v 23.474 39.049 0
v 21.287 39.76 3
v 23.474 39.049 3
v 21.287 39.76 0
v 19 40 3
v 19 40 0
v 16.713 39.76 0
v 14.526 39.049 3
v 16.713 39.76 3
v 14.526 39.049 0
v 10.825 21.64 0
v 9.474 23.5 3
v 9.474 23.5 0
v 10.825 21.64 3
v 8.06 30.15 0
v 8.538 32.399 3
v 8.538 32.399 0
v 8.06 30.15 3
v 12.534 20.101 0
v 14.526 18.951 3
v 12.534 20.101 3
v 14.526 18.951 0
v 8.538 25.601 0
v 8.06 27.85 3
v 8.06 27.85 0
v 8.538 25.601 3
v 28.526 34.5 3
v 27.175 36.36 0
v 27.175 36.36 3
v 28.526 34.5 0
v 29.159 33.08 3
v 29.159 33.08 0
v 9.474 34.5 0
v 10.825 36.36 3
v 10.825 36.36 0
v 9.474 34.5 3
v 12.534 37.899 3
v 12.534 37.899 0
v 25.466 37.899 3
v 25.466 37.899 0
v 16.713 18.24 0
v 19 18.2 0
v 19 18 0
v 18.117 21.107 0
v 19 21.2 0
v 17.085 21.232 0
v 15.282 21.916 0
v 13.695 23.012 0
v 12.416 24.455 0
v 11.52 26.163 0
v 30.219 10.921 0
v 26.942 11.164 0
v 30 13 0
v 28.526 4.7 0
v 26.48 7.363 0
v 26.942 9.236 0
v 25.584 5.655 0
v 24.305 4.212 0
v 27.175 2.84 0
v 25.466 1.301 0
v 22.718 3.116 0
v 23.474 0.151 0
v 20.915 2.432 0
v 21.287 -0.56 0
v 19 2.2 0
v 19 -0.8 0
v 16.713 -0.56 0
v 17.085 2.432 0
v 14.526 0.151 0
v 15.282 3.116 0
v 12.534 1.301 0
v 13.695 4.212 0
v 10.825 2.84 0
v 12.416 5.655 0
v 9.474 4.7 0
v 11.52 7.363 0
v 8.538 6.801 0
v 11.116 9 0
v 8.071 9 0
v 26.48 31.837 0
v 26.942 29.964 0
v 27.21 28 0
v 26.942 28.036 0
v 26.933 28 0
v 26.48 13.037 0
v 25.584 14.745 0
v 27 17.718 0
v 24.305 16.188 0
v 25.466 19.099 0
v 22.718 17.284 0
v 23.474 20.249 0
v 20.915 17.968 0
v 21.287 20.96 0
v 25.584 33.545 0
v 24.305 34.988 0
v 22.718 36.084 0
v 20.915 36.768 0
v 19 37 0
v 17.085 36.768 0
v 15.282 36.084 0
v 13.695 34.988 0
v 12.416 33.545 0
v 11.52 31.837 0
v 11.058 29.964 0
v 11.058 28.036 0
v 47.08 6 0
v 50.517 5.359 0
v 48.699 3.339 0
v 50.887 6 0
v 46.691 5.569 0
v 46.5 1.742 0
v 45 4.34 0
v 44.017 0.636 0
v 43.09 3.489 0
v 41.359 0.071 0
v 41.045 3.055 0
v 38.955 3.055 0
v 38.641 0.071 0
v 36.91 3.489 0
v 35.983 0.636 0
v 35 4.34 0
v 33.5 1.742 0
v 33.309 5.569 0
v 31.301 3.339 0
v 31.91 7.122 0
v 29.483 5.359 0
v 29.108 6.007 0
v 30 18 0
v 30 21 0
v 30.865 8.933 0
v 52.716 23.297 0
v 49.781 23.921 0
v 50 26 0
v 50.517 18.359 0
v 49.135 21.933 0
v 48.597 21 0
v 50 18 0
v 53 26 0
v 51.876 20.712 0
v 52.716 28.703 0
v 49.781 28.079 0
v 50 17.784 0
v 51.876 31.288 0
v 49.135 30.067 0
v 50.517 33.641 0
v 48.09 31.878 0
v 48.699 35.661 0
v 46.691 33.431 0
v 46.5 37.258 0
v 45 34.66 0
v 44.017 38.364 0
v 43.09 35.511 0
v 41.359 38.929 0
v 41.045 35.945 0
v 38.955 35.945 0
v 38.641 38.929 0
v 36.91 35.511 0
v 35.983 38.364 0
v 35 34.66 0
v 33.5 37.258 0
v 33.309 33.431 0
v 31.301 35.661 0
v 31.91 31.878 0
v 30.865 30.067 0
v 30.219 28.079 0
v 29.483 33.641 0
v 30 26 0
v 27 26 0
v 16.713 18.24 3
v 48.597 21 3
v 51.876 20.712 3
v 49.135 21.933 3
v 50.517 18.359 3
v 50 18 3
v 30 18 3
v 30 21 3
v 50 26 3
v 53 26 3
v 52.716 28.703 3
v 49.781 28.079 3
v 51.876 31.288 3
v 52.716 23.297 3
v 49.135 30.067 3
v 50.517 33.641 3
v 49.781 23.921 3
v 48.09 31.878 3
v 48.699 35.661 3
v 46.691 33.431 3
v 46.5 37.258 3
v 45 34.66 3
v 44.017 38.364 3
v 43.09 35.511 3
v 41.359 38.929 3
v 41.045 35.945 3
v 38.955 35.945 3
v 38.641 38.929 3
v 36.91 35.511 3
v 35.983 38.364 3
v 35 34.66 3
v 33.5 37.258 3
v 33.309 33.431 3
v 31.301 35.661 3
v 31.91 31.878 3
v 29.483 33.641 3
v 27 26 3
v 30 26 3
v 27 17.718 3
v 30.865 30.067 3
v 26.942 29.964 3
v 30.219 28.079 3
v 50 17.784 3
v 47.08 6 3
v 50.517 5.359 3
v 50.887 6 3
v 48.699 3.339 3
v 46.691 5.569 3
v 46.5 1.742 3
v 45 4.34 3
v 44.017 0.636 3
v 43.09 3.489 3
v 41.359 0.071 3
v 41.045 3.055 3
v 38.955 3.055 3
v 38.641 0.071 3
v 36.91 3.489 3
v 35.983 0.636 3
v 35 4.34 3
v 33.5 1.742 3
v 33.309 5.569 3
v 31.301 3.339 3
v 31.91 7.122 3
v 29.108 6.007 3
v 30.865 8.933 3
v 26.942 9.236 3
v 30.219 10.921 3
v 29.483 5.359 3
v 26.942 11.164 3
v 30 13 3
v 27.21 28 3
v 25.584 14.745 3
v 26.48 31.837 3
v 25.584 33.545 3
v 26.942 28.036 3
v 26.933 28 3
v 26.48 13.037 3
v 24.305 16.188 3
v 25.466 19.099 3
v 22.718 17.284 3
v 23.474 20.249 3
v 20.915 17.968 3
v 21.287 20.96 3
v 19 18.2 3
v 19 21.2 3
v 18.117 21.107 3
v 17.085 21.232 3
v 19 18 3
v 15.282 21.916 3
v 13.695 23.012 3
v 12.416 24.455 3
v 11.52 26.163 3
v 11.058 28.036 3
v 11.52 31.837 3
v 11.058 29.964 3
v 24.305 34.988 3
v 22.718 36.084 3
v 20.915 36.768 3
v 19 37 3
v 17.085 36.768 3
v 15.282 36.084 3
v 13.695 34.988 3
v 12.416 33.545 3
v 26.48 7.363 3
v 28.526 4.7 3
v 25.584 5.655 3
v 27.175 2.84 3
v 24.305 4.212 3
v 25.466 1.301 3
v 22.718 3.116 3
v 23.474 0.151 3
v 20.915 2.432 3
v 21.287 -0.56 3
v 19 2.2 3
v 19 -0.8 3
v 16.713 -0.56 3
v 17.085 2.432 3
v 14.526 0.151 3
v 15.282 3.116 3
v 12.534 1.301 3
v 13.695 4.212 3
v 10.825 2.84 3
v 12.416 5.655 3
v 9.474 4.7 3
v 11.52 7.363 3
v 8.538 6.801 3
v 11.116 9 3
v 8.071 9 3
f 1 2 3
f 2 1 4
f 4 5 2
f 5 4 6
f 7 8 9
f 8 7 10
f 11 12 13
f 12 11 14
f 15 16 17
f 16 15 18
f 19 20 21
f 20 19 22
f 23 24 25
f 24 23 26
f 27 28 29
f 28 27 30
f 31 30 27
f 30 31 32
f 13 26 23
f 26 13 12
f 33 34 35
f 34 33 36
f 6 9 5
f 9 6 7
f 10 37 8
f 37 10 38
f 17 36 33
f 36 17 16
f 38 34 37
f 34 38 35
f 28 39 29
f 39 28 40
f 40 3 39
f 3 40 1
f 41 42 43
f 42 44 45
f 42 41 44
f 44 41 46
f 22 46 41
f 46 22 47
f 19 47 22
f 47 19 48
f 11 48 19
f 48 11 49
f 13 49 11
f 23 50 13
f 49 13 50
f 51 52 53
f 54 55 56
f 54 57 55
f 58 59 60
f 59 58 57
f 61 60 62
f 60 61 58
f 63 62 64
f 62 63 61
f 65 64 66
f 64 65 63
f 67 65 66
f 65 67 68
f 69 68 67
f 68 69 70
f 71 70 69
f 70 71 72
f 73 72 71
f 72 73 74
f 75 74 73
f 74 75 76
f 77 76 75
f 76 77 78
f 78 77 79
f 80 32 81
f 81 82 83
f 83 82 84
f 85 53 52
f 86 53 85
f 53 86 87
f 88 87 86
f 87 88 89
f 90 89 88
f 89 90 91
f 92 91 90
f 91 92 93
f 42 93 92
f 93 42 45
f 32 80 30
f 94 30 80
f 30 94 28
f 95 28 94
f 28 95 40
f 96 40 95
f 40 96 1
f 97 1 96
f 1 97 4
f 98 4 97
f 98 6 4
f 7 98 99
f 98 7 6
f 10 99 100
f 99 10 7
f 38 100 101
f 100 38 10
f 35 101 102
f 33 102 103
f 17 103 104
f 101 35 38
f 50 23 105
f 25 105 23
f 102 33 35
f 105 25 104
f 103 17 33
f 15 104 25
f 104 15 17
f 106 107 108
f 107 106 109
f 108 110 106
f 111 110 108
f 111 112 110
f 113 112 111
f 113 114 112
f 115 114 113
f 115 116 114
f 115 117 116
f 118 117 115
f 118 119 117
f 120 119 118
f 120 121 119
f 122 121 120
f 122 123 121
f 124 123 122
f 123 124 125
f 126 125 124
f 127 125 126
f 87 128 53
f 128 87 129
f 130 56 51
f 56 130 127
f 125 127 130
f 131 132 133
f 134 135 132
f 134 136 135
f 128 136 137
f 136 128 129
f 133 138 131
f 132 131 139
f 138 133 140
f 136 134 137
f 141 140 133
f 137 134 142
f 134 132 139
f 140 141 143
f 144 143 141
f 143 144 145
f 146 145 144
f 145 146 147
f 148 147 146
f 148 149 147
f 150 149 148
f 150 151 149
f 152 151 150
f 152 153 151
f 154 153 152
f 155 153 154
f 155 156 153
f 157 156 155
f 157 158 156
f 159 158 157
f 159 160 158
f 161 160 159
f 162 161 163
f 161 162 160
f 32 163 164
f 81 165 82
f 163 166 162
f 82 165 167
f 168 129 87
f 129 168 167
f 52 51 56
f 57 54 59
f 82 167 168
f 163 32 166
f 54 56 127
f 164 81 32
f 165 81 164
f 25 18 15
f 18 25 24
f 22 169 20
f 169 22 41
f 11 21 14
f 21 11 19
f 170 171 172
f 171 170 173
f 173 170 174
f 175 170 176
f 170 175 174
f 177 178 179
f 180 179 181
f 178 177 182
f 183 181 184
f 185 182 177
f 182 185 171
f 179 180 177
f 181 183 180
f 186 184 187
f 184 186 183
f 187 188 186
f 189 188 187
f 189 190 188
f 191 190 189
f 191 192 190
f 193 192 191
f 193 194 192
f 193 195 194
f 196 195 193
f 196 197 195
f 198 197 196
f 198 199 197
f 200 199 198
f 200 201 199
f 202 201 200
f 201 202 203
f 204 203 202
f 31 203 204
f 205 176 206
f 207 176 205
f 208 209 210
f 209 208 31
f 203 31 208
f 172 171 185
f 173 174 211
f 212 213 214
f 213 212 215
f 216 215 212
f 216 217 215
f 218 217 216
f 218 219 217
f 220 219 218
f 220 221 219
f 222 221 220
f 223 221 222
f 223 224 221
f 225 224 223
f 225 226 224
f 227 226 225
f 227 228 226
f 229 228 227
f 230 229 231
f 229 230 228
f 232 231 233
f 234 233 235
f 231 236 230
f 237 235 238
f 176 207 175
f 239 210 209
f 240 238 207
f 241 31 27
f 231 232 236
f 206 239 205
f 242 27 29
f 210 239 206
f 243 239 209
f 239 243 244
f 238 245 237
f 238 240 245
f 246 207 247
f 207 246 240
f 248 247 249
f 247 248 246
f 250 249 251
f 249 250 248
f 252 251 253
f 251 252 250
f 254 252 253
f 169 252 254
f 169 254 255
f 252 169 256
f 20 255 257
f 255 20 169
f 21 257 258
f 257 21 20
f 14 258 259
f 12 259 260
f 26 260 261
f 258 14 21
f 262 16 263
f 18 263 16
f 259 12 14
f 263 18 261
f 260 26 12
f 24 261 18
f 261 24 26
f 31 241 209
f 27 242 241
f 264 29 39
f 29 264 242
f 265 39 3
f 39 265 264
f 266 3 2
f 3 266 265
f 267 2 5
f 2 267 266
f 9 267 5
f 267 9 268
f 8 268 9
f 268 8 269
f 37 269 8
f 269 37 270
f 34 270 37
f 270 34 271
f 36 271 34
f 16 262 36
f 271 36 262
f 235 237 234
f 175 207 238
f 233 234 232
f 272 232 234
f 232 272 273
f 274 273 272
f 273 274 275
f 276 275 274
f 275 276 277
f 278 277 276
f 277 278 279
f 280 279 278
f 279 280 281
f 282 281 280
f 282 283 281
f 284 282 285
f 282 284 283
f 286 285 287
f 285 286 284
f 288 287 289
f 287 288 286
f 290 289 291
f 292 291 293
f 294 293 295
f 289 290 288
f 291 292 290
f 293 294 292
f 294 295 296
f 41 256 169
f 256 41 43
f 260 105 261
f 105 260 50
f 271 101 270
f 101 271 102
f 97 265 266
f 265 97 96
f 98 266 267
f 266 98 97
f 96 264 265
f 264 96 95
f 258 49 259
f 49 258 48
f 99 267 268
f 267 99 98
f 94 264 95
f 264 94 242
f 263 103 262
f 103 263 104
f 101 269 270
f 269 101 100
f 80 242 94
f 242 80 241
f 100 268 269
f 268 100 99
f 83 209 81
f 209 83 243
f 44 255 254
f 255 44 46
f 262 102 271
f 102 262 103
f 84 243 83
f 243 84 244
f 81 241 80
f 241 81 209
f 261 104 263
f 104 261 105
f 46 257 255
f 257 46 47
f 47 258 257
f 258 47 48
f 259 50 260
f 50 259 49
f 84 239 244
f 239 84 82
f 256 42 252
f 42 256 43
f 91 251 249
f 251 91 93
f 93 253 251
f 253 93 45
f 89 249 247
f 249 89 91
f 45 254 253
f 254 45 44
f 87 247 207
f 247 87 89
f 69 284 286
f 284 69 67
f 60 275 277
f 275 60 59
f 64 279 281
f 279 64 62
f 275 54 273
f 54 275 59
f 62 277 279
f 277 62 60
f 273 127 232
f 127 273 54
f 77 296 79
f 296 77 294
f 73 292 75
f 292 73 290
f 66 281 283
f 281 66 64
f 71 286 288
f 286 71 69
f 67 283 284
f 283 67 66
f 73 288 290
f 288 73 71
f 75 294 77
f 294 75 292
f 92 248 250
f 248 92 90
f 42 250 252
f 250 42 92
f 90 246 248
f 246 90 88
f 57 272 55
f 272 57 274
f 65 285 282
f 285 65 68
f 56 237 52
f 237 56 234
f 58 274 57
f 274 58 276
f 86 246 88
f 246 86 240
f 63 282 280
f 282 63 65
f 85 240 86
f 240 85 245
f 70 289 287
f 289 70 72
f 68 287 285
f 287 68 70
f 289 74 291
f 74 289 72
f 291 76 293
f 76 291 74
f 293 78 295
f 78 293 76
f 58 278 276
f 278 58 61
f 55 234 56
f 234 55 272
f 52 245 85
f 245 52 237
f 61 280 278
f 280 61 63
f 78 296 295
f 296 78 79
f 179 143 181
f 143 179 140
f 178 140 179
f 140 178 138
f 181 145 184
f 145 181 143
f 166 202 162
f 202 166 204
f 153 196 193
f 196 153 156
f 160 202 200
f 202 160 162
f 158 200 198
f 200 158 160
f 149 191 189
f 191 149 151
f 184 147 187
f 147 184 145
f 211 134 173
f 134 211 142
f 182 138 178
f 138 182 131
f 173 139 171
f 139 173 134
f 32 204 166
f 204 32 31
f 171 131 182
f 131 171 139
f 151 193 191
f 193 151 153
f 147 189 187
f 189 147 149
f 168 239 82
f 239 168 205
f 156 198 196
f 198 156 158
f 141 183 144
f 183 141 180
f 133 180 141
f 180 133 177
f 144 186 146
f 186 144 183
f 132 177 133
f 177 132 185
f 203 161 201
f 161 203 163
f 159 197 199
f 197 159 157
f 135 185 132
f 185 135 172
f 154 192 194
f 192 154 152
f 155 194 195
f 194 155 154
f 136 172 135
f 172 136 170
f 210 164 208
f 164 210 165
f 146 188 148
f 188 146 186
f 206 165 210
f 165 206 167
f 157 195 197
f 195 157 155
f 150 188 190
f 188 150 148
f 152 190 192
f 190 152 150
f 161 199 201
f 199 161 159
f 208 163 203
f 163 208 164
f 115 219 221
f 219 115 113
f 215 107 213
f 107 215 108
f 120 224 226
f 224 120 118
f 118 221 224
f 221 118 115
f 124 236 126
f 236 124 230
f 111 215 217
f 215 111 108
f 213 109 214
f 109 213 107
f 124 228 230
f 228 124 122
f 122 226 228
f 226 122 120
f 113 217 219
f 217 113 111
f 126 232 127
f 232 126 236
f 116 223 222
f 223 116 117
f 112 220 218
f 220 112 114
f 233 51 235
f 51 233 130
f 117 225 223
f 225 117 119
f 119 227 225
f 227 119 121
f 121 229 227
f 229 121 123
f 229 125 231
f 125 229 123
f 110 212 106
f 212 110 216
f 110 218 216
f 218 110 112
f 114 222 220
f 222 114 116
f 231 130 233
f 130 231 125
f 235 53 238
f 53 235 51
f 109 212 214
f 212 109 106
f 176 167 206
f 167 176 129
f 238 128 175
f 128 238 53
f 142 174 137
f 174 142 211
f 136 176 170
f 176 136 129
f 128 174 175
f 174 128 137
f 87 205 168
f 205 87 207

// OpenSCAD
// s
translate([19,28,3]) rotate([180,0,90]){

union(){
difference(){
 translate([1,0,0]) cylinder(3,11,11);
translate([1,0,-1]) cylinder(5,8,8);
 translate([-11,0,-1]) cube(11);

}

difference(){
 translate([-17.8,0,0]) cylinder(3,11,11);
 translate([-17.8,0,-1]) cylinder(5,8,8);
 translate([-19,-11,-1]) cube(11);

}
}

}
//буква e

union(){
translate([28,18,0]) cube([22,3,3]);
translate([27,13,0]) cube([3,13,3]);
difference(){
union(){
	
  difference(){
  translate([40,26,0]) cylinder(3,13,13);
  translate([40,26,-1]) cylinder(5,10,10);
  translate([32,12,-1]) cube([16,10,5]);

}

difference(){
  translate([40,13,0]) cylinder(3,13,13);
  translate([40,13,-1]) cylinder(5,10,10);
  translate([32,15,-1]) cube([19,13,5]);
  translate([40,6,-1]) cube(20);
}
}
translate([30,13,-1]) cube([3,13,5]);
translate([40,10,-1]) cube(10);
}
}
